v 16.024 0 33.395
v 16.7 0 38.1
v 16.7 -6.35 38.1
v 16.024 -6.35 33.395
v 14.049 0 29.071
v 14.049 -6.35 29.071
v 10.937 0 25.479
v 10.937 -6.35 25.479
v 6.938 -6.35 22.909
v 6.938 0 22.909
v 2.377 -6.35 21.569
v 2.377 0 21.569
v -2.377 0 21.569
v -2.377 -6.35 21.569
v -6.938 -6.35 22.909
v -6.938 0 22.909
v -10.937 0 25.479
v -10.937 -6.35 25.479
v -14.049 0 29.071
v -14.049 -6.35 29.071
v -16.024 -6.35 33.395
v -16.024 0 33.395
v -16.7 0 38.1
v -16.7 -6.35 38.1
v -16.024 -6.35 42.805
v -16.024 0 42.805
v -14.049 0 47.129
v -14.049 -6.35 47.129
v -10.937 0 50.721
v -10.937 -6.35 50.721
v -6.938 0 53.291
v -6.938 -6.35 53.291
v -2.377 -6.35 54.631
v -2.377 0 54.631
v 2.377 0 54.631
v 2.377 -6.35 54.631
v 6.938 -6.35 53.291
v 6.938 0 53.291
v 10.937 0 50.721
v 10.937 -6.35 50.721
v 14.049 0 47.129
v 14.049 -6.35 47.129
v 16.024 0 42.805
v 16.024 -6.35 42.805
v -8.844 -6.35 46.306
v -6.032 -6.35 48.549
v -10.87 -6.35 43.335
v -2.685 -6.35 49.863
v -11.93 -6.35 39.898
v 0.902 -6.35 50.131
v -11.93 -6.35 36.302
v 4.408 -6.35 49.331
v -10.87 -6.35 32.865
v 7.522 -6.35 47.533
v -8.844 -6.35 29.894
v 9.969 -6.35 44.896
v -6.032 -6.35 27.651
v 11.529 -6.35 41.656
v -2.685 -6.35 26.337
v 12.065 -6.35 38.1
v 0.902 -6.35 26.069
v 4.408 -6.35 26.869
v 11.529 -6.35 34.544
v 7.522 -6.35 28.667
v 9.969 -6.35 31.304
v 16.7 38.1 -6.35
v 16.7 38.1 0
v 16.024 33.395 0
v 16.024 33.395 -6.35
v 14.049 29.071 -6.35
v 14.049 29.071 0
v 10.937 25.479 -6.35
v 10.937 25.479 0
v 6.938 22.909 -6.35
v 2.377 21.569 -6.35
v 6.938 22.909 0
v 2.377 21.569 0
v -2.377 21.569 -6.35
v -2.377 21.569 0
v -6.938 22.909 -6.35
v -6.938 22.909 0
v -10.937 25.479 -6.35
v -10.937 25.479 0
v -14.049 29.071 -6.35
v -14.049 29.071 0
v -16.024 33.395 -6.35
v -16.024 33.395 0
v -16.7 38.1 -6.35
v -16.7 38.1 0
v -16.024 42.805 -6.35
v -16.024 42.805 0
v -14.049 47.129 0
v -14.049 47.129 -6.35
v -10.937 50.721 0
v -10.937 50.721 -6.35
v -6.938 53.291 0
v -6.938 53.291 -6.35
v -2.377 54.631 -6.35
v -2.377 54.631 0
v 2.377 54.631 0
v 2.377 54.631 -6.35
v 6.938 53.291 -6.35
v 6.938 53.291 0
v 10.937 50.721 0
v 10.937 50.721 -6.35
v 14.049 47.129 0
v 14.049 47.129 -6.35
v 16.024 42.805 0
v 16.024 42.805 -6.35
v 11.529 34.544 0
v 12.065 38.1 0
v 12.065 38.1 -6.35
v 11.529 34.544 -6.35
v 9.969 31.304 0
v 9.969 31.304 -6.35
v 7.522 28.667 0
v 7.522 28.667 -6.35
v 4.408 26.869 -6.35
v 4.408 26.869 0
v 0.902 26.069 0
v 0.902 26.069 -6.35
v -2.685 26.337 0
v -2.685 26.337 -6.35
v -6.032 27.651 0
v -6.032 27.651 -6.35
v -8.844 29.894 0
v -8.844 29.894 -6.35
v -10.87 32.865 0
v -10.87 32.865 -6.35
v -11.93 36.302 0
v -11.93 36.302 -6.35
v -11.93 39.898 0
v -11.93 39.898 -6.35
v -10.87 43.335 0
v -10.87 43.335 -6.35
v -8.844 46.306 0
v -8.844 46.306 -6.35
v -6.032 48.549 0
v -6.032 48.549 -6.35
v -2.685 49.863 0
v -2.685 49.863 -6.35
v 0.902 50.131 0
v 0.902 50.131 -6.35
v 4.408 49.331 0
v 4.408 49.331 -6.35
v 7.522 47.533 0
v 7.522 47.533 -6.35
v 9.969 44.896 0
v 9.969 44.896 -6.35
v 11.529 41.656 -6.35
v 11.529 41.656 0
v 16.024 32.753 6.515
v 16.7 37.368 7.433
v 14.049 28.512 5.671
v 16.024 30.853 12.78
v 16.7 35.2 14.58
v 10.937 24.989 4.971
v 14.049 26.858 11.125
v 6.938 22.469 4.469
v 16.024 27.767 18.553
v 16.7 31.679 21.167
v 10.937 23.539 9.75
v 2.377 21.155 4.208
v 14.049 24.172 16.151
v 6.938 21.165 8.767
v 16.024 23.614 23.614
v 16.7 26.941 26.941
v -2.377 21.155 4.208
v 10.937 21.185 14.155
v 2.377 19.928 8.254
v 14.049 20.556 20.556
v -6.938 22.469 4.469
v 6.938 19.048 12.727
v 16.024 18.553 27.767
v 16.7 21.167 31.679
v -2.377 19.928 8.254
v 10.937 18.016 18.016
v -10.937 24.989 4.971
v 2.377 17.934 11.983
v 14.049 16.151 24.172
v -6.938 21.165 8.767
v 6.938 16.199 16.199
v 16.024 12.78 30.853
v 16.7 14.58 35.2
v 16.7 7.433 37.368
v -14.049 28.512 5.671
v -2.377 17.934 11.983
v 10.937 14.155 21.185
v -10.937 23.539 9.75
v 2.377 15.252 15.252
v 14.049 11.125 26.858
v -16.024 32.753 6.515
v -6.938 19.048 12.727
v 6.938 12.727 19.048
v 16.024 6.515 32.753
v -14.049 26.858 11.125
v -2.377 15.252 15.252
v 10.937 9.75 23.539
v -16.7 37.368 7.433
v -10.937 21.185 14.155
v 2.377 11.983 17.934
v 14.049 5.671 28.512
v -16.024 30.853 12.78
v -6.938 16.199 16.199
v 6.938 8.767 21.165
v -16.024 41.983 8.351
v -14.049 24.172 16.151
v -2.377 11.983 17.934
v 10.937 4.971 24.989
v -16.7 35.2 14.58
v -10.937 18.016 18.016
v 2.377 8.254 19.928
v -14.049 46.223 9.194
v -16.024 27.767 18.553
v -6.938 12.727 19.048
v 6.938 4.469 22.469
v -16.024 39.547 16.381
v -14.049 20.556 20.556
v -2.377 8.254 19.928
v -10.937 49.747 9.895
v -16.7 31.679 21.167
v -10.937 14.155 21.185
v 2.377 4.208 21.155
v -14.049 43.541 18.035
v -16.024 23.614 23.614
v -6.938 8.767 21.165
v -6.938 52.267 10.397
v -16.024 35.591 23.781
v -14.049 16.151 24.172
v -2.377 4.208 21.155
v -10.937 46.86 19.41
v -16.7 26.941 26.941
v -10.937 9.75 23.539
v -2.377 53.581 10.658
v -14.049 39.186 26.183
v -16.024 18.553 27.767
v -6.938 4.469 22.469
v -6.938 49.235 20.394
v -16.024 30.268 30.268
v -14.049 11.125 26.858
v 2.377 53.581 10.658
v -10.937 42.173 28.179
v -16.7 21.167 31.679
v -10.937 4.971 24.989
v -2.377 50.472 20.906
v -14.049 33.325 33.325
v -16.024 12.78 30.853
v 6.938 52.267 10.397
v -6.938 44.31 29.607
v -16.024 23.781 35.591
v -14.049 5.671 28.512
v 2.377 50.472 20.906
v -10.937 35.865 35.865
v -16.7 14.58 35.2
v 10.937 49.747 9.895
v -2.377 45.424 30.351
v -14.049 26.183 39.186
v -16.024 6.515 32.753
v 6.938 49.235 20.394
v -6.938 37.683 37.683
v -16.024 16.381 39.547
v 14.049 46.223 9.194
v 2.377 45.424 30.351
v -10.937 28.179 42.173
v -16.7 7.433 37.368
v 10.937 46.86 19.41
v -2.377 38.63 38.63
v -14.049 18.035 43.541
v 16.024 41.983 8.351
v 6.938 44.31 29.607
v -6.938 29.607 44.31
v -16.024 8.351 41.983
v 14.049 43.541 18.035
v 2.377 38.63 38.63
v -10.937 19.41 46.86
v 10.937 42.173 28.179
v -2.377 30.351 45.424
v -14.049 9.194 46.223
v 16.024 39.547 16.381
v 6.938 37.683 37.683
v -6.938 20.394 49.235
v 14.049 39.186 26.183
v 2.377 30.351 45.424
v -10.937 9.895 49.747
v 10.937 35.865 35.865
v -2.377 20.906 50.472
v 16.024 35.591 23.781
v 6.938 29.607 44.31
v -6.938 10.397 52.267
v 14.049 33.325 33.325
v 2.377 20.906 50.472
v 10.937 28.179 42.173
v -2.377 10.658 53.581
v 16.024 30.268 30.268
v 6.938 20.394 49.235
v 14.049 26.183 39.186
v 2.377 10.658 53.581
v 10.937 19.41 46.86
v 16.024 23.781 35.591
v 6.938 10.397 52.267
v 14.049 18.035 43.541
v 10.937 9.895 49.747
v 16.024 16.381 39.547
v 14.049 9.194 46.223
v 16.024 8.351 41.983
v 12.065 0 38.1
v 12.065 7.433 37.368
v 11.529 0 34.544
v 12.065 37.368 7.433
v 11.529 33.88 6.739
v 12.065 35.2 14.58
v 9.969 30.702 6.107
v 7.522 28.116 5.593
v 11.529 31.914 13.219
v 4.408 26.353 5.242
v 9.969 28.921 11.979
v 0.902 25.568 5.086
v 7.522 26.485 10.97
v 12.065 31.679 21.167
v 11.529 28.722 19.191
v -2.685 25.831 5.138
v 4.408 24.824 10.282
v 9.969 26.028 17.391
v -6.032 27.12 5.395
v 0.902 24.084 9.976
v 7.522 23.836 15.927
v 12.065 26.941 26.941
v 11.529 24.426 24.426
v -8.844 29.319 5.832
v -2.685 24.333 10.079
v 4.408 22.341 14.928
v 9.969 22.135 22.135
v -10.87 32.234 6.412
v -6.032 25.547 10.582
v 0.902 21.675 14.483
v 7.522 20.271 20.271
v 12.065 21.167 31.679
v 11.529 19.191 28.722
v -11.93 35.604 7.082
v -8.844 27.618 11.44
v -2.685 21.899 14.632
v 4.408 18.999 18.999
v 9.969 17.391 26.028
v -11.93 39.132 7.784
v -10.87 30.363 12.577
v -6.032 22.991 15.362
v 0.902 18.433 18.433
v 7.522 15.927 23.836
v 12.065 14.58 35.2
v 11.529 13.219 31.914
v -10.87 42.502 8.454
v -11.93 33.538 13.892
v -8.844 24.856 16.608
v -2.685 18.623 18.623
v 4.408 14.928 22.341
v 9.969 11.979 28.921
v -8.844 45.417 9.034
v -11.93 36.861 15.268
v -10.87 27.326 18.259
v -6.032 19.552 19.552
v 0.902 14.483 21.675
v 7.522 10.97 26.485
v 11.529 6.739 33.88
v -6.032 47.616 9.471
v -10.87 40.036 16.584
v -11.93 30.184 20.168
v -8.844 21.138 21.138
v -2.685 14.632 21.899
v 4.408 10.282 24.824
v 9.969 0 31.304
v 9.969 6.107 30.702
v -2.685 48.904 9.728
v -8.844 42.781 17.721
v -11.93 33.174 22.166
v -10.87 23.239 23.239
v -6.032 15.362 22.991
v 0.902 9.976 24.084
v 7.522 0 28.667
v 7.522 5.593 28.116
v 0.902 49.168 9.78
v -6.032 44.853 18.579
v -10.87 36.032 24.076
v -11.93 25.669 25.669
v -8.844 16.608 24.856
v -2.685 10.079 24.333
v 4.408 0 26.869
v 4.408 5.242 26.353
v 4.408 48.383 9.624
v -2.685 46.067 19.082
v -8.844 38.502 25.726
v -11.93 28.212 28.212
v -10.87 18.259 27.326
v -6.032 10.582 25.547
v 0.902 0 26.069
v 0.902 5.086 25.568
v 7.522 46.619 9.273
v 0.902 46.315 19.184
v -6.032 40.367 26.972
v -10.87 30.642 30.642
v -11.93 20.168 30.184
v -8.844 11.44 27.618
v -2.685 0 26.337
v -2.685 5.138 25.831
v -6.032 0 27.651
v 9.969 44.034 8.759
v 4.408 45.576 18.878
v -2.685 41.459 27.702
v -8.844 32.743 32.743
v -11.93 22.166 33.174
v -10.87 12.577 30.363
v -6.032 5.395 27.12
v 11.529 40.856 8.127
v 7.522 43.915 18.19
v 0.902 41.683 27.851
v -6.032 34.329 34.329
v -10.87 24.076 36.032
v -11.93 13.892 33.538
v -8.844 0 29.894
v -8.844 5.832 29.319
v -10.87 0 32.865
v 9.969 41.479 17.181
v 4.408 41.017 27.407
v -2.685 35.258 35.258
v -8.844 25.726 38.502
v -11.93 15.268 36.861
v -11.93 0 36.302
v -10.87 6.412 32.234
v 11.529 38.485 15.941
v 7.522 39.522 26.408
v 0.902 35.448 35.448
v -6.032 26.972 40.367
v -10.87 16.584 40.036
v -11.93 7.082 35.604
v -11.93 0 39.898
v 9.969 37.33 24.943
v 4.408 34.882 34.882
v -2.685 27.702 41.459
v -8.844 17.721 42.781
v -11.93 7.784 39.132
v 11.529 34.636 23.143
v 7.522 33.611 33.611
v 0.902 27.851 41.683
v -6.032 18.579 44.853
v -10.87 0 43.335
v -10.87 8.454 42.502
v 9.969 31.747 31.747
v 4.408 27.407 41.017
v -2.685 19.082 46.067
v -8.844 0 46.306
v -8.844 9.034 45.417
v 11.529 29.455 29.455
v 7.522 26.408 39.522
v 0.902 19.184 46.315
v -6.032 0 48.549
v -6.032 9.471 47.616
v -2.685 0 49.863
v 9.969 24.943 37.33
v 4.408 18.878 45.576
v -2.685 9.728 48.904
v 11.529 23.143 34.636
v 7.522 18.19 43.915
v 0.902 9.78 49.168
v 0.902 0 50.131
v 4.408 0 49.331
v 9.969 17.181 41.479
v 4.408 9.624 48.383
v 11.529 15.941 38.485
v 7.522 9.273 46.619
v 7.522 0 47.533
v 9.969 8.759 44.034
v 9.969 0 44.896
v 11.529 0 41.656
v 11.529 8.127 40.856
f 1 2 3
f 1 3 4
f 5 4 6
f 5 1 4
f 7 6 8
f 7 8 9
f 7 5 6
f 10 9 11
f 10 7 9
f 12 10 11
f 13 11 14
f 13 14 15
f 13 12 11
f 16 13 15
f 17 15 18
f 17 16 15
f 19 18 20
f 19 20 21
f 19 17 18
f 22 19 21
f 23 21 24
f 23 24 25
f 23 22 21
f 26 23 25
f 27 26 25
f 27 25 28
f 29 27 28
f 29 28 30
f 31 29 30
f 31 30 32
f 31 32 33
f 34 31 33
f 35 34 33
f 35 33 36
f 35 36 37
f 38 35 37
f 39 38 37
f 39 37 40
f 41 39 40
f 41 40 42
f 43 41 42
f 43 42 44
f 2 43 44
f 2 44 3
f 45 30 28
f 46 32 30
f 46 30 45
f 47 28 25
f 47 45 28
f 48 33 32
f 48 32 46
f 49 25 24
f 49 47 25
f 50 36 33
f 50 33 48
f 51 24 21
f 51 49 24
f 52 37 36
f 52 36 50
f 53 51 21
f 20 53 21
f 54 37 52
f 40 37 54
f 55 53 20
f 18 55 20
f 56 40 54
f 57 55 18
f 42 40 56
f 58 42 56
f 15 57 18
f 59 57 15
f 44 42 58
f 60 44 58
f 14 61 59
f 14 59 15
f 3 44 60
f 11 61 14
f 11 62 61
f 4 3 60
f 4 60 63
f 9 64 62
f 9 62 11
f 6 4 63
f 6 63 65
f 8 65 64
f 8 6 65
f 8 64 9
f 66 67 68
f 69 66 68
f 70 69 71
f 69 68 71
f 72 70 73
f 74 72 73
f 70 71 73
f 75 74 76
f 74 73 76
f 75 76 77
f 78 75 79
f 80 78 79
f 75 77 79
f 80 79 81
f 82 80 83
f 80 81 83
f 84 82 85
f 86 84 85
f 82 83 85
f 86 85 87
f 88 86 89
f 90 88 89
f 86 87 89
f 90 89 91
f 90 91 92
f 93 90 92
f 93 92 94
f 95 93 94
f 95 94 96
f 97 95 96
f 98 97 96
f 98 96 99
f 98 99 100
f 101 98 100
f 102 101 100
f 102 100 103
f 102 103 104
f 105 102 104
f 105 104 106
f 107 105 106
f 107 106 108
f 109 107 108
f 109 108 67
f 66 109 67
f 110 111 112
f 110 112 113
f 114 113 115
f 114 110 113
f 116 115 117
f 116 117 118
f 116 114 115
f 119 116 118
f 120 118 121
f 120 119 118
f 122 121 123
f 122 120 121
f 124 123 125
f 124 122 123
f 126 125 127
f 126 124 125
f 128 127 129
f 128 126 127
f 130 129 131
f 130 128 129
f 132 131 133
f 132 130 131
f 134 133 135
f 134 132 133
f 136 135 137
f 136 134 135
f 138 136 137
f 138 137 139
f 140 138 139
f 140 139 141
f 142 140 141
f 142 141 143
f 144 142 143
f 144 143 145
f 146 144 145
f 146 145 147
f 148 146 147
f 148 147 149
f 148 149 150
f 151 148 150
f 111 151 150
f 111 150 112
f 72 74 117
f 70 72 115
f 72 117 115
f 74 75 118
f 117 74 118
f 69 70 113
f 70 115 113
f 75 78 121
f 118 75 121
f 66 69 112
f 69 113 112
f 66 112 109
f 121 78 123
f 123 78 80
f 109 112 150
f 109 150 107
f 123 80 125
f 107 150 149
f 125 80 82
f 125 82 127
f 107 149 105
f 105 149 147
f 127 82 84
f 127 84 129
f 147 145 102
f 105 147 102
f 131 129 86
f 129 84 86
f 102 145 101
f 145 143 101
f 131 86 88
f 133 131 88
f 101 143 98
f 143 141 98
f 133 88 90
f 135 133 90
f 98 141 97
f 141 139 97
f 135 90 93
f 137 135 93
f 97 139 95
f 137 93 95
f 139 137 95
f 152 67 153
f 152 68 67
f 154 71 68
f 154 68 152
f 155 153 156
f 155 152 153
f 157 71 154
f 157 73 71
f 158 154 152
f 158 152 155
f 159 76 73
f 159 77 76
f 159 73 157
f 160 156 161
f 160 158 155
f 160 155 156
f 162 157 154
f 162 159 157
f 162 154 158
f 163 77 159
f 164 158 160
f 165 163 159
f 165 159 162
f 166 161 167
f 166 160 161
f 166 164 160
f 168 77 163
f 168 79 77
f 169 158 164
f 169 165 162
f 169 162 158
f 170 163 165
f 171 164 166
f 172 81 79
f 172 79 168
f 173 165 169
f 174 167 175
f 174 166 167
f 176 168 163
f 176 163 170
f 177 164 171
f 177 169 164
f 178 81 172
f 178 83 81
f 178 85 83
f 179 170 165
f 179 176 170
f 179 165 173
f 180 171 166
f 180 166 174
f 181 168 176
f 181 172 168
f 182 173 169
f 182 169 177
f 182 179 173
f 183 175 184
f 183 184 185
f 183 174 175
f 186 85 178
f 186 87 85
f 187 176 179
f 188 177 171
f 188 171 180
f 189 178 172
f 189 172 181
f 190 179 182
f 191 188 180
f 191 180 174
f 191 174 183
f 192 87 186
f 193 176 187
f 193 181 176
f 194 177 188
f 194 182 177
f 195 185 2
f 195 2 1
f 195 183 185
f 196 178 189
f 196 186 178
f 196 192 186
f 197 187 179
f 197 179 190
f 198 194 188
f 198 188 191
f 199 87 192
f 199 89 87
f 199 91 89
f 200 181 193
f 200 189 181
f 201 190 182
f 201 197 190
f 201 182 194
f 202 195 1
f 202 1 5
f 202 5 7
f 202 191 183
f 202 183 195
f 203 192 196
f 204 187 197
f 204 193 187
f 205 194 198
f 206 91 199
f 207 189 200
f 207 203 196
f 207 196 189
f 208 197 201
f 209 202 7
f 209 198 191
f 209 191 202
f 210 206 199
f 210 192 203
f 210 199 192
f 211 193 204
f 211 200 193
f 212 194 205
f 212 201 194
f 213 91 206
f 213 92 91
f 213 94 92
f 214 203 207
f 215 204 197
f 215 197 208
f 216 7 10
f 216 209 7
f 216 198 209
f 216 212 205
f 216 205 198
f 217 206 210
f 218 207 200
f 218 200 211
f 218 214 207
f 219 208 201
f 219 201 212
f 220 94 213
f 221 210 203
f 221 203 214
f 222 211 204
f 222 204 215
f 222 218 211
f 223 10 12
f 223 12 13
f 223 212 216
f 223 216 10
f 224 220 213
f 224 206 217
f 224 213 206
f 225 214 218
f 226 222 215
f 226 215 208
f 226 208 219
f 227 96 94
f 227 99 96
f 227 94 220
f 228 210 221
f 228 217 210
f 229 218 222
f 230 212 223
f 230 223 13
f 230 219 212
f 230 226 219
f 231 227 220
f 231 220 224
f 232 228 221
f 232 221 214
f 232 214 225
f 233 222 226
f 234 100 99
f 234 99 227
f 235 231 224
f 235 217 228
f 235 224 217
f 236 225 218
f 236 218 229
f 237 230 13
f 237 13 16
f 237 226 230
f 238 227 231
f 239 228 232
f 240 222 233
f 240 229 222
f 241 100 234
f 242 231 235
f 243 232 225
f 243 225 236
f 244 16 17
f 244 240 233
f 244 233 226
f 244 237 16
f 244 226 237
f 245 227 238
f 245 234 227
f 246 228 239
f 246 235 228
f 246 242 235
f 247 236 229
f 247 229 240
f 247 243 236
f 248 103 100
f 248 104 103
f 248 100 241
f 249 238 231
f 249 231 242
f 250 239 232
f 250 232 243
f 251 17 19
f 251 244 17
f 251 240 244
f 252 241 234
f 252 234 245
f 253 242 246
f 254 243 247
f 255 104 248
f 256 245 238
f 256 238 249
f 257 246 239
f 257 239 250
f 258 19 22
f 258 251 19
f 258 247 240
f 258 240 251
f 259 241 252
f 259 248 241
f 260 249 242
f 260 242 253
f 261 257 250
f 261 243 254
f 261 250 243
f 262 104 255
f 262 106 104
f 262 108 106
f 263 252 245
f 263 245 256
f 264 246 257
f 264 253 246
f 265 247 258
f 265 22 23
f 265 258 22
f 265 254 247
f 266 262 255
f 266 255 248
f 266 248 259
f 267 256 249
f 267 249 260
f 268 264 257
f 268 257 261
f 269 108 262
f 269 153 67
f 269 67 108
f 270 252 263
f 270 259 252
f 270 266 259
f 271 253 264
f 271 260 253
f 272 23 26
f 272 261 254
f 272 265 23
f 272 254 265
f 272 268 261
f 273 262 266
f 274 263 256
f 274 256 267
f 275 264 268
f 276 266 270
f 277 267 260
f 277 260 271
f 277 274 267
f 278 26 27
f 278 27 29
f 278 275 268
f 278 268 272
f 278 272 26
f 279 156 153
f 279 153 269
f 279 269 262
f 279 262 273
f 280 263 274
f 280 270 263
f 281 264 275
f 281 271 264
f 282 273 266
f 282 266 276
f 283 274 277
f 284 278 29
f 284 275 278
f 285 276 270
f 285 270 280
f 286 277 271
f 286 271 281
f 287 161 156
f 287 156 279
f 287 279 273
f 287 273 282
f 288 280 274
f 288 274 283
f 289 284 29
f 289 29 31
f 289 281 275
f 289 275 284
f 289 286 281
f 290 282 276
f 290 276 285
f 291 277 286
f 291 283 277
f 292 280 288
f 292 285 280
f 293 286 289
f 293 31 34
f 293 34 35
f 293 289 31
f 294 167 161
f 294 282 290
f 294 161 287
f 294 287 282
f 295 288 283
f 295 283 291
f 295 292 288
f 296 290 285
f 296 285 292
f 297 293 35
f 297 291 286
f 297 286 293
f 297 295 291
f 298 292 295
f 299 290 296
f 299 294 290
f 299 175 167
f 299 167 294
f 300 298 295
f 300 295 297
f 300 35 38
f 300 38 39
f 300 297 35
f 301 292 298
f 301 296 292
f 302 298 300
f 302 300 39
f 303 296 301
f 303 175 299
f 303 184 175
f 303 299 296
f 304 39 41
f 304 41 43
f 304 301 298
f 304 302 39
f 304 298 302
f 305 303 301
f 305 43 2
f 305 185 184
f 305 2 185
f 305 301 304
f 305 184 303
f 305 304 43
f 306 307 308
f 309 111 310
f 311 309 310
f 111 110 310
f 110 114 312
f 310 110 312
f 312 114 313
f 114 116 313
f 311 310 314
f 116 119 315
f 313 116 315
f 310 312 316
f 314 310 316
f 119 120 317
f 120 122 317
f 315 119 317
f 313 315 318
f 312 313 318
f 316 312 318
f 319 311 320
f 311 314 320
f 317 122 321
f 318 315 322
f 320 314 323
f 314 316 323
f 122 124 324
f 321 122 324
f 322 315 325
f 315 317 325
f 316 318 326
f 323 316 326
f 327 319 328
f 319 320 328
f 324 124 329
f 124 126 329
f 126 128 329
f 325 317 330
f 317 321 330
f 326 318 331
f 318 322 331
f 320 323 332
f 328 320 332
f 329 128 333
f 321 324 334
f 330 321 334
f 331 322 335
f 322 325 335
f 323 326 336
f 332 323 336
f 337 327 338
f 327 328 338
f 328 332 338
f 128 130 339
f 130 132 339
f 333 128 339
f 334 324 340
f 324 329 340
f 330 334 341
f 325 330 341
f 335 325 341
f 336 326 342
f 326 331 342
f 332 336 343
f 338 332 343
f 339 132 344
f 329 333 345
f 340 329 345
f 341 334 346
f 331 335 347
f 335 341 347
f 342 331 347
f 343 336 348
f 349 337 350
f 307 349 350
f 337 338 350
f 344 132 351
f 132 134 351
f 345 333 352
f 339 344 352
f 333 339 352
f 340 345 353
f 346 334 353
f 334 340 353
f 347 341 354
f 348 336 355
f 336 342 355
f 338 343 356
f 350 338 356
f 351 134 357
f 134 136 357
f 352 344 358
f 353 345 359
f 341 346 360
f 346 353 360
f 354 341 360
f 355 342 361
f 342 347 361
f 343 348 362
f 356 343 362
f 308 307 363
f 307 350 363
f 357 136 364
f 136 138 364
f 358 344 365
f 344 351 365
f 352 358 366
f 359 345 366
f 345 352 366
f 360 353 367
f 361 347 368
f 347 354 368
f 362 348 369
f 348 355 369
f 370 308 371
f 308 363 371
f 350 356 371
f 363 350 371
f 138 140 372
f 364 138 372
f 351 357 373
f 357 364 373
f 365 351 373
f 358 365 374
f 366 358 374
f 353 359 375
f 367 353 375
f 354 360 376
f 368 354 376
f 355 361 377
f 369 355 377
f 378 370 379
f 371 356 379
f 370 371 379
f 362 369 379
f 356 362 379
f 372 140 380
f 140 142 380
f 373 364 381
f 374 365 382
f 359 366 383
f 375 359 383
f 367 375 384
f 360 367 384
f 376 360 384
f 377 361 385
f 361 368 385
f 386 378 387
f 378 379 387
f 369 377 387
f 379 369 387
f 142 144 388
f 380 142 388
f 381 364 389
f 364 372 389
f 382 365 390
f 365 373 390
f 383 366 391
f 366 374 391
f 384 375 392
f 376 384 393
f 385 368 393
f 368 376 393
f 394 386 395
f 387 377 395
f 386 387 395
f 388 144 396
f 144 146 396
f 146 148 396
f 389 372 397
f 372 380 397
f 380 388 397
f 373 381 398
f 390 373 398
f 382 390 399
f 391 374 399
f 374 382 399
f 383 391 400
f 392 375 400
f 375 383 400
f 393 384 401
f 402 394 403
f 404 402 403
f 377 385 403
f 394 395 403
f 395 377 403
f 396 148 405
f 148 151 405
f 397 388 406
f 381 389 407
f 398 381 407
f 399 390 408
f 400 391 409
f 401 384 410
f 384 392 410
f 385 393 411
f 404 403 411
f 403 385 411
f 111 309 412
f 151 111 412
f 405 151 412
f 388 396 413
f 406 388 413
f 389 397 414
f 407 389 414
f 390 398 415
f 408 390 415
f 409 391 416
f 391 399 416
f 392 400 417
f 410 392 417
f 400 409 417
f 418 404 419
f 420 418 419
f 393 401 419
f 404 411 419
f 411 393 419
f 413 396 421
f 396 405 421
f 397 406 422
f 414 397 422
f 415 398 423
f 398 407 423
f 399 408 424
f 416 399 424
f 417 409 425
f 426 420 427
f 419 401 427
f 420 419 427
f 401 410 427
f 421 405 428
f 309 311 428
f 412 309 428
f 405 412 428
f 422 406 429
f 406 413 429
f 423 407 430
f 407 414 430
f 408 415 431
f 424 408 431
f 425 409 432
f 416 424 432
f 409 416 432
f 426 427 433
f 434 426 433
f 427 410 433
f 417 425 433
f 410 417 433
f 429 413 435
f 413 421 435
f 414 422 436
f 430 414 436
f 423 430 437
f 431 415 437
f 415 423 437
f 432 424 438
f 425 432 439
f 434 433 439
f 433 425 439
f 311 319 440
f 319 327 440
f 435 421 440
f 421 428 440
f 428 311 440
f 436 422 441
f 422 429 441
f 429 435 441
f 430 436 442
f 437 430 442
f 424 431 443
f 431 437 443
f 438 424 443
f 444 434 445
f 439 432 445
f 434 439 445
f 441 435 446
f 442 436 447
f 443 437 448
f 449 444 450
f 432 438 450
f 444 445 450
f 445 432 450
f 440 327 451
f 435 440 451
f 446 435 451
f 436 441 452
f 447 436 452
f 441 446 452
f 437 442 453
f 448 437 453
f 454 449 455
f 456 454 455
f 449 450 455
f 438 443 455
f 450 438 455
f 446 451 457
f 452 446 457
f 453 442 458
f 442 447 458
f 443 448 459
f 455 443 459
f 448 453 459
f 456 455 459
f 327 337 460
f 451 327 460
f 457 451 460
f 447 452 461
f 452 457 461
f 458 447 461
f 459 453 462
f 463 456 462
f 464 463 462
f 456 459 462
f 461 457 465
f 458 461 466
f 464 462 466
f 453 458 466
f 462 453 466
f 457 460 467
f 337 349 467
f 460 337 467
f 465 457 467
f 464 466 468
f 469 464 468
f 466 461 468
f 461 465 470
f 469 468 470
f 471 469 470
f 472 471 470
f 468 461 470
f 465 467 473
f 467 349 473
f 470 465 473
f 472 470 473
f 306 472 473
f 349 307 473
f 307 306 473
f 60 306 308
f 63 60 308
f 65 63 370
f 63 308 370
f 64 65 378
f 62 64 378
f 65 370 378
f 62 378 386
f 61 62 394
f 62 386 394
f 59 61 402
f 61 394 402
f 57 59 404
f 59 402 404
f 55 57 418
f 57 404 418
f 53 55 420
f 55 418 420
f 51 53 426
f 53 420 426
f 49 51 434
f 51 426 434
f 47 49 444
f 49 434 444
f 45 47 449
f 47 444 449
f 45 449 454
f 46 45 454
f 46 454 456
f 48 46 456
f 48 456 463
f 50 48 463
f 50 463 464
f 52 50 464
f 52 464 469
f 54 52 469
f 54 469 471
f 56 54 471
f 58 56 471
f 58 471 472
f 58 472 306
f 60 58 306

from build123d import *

# Parameters (mm, degrees)
F1_R     = 16.7005
F1_R_2   = 12.065
F3_DEPTH = 6.35
F4_DEPTH = 6.35


with BuildPart() as f2:
    # F2: sweep along a path in F0
    with BuildLine(Plane.YZ) as f2_path:
        ThreePointArc((38.1, 0), (26.9407683632, 26.9407683632), (0, 38.1))
    # F1 (on Front) → F2 (sweep)
    with BuildSketch(Plane.XZ):
        with Locations((0, 38.1)):
            Circle(F1_R)
        with Locations((0, 38.1)):
            Circle(F1_R_2, mode=Mode.SUBTRACT)
    sweep(path=f2_path.line)

    # F3 (add): a face of the model
    f3_faces = [f2.faces().sort_by_distance(p)[0] for p in [
        (-16.228138528, 0, 38.1),
    ]]
    extrude(f3_faces, amount=F3_DEPTH)

    # F4 (add): a face of the model
    f4_faces = [f2.faces().sort_by_distance(p)[0] for p in [
        (-16.228138528, 38.1, 0),
    ]]
    extrude(f4_faces, amount=F4_DEPTH)


solid = f2.part
